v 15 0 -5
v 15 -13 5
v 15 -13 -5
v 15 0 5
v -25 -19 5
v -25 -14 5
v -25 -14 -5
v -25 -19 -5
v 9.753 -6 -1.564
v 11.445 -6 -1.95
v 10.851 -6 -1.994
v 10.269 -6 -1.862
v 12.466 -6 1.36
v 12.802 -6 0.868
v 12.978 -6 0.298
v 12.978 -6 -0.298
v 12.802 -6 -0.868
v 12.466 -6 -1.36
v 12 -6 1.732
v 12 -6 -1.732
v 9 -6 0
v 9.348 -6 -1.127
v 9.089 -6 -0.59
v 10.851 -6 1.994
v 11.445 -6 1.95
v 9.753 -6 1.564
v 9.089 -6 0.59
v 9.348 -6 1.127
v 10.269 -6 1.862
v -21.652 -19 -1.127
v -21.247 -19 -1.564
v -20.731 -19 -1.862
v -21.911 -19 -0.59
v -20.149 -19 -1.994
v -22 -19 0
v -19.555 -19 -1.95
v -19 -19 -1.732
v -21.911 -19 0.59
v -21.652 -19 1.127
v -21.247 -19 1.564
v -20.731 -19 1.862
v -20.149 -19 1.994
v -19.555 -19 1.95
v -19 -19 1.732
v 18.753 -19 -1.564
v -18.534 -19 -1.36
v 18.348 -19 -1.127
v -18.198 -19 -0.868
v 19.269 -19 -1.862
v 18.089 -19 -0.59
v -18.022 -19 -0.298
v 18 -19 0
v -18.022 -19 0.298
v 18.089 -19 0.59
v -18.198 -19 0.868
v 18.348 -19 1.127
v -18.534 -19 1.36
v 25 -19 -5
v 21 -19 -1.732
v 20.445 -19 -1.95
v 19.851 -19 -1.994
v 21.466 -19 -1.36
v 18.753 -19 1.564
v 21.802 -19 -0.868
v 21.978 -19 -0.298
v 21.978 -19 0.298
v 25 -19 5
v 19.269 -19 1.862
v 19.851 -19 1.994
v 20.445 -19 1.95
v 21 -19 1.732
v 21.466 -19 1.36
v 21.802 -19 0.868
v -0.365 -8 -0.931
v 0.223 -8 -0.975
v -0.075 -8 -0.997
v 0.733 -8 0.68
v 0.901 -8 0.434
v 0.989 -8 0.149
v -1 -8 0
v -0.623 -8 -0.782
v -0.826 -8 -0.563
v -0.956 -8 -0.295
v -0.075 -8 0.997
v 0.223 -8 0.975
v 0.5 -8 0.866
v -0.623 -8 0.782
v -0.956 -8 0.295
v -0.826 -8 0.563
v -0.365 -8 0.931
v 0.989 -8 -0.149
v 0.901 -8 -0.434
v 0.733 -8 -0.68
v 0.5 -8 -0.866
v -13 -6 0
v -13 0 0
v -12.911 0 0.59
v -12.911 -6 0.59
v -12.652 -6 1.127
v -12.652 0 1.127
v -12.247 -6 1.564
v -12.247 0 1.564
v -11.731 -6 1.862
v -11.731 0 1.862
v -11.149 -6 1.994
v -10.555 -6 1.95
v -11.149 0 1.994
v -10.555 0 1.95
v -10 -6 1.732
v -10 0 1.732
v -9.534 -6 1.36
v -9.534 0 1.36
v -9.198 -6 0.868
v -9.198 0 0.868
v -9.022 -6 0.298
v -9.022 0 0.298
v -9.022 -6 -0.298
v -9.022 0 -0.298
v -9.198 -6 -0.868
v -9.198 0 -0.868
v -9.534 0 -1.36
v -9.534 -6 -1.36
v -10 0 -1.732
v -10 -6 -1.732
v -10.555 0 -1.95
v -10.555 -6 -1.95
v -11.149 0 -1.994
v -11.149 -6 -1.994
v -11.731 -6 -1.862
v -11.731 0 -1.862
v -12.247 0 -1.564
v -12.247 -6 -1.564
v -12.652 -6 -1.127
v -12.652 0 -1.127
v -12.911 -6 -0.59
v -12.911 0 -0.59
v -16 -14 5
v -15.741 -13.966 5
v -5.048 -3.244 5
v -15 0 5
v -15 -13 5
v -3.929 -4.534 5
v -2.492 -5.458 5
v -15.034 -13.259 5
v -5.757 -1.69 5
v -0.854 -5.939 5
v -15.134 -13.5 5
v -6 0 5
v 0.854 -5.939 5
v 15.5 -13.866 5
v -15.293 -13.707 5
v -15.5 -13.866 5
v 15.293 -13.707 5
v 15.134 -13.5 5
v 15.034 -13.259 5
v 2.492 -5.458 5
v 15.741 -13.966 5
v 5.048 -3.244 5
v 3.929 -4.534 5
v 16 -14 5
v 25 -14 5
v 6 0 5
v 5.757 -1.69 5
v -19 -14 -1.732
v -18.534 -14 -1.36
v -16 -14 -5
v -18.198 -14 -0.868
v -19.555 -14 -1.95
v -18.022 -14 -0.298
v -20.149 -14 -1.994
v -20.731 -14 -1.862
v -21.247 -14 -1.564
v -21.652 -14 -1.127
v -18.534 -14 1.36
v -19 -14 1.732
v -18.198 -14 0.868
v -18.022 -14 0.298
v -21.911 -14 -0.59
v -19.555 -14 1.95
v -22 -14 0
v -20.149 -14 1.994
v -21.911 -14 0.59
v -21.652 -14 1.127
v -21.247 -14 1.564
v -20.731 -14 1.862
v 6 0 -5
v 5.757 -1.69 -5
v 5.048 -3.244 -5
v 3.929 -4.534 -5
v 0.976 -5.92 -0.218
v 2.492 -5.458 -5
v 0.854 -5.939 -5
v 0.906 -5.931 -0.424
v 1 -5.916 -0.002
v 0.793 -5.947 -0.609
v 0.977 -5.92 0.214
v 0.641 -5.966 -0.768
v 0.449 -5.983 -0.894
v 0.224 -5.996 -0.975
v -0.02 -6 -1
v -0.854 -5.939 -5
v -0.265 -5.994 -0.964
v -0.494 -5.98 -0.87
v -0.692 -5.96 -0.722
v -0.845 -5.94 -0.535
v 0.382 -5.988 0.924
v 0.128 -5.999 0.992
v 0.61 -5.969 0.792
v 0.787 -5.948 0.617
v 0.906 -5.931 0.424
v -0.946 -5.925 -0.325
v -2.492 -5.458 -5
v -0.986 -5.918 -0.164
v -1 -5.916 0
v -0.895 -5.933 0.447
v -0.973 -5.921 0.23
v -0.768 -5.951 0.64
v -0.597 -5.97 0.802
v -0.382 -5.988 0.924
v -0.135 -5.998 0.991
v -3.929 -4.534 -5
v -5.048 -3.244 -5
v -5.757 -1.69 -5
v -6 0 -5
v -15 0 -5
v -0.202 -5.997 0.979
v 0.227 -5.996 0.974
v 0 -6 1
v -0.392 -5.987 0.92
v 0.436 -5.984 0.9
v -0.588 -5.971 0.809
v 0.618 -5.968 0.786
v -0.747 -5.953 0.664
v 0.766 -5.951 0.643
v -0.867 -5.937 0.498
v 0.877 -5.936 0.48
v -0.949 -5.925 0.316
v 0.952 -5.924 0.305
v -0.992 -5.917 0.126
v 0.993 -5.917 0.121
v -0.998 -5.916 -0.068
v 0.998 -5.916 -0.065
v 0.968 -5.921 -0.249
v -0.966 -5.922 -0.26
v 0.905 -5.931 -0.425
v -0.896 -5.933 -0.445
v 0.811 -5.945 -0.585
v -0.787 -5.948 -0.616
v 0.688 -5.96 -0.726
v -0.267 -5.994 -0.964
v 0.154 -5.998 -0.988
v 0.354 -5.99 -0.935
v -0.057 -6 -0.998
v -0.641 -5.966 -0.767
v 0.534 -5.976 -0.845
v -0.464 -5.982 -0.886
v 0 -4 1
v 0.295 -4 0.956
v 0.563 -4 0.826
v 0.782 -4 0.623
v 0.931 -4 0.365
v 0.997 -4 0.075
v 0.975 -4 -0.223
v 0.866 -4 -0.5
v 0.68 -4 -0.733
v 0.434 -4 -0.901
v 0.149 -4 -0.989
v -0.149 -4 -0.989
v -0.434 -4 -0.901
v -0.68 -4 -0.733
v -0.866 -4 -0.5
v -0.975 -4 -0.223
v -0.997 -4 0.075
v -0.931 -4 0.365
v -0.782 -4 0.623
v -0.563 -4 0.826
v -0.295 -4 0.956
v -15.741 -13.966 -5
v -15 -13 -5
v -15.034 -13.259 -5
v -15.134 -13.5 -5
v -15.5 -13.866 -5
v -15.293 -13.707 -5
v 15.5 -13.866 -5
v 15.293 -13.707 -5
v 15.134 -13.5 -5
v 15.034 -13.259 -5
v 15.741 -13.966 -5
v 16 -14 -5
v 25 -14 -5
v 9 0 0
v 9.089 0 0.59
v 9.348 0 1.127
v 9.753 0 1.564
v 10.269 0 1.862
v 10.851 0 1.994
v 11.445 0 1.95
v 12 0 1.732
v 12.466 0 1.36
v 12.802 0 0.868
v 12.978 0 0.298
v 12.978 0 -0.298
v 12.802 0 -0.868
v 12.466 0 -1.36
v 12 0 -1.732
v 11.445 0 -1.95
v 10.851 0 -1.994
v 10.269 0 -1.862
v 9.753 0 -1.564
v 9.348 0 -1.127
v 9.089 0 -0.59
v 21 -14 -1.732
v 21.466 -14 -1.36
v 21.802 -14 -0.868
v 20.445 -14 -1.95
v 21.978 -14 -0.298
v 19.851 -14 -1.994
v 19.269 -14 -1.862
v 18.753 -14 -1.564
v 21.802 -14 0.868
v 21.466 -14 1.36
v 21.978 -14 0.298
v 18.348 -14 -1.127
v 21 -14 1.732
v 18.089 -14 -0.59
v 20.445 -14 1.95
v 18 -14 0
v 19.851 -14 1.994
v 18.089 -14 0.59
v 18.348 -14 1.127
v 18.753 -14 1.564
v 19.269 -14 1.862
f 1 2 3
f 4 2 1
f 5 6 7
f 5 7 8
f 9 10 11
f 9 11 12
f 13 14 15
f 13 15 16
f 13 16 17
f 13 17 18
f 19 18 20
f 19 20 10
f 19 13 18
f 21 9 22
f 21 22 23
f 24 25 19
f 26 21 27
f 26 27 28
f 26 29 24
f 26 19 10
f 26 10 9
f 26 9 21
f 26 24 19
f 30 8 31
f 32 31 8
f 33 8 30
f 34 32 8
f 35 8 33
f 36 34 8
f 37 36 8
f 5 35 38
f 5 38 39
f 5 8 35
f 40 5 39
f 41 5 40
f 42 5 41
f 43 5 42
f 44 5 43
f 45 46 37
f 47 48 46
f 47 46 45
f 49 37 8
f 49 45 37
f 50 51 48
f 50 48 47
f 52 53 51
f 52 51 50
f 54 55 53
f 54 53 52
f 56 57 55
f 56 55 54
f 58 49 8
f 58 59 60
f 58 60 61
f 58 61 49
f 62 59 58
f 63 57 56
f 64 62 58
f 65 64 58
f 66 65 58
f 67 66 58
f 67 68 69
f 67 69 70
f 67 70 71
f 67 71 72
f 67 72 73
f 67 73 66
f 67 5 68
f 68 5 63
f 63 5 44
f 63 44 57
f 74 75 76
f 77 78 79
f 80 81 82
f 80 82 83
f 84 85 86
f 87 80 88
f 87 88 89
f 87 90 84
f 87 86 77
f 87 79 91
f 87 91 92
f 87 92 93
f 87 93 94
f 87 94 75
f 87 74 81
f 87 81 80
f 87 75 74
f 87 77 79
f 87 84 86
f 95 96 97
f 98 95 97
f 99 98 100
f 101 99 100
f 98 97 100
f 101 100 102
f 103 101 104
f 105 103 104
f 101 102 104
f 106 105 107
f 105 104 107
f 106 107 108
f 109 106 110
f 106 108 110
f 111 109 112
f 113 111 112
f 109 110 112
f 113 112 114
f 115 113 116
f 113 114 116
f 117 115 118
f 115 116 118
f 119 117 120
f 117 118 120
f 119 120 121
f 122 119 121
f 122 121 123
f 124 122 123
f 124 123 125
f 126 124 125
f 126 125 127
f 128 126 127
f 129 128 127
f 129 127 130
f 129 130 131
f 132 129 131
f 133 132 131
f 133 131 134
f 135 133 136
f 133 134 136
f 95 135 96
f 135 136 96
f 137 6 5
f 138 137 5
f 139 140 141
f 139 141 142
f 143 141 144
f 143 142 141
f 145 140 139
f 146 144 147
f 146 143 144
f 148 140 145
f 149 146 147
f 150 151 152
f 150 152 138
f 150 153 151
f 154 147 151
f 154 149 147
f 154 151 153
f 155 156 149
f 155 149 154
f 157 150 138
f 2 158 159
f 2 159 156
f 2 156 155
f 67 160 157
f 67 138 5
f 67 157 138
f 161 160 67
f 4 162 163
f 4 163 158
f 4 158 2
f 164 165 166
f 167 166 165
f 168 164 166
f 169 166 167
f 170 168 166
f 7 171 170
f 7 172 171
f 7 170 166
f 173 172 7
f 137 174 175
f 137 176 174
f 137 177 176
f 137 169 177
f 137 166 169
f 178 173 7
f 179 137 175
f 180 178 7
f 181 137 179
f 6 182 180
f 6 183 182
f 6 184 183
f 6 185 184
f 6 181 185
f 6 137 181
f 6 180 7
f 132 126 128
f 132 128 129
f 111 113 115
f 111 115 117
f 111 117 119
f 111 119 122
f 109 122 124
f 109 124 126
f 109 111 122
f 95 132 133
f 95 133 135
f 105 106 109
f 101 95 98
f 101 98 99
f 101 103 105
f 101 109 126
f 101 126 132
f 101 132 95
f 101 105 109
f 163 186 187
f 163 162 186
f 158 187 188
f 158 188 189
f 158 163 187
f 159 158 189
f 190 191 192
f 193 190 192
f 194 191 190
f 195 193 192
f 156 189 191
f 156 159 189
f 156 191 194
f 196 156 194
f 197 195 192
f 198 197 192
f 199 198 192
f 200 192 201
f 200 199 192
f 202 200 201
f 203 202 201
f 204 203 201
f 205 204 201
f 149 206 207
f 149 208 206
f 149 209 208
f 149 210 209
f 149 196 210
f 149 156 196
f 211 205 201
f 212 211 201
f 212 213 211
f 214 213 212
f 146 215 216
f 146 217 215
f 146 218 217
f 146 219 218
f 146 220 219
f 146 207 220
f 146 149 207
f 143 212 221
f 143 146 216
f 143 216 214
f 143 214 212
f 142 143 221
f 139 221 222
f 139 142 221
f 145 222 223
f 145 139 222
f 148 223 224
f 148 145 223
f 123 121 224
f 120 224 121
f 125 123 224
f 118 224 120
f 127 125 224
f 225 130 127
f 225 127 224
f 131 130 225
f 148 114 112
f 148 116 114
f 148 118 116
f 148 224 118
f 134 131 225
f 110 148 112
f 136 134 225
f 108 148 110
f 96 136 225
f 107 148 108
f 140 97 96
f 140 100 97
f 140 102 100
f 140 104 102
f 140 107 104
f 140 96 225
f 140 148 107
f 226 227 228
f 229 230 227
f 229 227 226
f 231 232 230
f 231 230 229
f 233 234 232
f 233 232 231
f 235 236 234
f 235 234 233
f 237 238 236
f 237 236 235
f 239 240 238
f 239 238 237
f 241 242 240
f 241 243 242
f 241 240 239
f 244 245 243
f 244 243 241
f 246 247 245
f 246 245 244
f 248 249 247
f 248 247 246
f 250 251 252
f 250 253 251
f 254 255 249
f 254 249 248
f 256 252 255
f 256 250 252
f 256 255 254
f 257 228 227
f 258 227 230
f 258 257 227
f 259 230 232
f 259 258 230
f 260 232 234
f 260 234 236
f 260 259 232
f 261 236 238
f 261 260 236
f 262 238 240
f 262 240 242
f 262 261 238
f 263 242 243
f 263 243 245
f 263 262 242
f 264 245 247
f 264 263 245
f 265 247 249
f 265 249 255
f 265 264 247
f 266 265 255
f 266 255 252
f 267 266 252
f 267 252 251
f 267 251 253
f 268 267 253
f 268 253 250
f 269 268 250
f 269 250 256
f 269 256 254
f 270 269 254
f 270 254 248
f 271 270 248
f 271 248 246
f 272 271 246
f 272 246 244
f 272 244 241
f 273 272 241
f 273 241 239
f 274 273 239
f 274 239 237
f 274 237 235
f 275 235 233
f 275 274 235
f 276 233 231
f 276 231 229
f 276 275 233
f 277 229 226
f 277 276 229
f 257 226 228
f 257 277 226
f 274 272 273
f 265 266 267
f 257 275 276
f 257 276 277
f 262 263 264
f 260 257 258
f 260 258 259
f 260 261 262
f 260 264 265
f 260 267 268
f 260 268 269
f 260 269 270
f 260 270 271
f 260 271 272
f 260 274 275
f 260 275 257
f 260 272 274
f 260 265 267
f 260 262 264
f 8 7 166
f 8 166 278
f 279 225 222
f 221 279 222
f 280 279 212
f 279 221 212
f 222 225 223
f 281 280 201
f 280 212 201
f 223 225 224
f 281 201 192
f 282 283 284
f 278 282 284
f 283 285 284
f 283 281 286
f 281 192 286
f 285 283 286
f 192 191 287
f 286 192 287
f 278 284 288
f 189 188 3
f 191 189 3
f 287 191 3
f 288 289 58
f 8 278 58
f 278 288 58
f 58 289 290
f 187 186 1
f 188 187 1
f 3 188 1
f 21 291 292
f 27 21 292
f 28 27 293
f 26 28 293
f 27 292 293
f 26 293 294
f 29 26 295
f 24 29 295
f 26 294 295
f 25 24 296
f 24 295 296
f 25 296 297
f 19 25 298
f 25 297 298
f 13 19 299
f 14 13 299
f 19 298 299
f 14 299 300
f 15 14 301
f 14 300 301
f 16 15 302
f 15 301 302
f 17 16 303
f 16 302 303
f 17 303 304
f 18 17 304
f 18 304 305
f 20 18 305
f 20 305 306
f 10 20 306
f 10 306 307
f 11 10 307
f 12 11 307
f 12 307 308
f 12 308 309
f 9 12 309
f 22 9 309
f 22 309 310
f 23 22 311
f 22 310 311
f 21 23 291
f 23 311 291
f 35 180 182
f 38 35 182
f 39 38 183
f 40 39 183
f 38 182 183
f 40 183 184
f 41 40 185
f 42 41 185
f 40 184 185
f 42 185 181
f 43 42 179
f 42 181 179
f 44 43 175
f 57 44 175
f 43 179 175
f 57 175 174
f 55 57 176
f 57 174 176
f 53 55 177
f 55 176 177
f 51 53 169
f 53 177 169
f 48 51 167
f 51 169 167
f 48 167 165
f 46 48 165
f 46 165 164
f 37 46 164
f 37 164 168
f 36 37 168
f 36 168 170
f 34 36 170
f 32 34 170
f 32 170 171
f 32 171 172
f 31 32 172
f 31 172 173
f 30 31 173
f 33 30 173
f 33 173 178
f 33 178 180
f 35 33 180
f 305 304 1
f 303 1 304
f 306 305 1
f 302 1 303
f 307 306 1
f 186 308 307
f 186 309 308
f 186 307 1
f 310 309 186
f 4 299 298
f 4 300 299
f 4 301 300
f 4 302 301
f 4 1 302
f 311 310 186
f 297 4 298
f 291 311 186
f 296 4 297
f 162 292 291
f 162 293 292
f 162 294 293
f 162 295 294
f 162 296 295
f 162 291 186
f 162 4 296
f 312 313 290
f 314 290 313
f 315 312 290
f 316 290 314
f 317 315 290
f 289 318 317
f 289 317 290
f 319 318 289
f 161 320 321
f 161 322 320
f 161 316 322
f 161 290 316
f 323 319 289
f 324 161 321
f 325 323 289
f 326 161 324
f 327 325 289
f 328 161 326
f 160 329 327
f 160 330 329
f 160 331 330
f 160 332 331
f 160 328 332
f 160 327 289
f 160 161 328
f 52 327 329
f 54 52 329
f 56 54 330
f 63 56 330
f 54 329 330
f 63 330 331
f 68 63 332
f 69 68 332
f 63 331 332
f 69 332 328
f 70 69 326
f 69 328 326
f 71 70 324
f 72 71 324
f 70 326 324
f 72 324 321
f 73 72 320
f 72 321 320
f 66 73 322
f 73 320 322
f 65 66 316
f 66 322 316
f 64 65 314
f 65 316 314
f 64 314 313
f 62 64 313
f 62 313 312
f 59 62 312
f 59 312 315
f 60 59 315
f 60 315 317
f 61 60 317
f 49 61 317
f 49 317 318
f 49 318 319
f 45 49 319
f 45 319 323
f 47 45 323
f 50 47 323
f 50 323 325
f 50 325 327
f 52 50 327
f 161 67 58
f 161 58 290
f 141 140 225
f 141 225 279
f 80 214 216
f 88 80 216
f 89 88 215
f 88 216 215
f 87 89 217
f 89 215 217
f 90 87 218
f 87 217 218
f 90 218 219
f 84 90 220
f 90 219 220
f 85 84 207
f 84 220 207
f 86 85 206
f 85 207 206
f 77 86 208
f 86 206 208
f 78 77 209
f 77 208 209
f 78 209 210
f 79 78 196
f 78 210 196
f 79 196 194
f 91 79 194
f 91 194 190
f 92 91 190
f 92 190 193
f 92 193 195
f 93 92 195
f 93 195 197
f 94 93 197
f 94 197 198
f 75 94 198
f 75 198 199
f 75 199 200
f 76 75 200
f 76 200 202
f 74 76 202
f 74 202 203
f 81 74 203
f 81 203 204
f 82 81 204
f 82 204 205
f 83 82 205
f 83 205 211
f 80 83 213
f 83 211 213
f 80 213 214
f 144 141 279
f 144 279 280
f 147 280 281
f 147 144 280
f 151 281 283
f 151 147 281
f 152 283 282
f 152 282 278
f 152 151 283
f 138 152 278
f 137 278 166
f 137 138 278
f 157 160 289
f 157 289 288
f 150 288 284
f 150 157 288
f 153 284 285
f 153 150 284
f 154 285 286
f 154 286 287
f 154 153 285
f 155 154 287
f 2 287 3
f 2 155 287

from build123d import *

# Parameters (mm, degrees)
BOSS_EXTRUDE1_DEPTH      = 5
SKETCH2_R                = 2
CUT_EXTRUDE1_DEPTH       = 30.086079144
SKETCH3_R                = 2
CUT_EXTRUDE2_DEPTH       = 6
SKETCH4_R                = 1
CUT_EXTRUDE3_DEPTH       = 8
BOSS_EXTRUDE3_REACH      = 31.58
BOSS_EXTRUDE3_END_RADIUS = 6
SKETCH5_R                = 1


with BuildPart() as part:
    # Sketch1 → Boss-Extrude1 (new, symmetric)
    with BuildSketch(Plane.XY):
        with BuildLine():
            Line((-6, 0), (-15, 0))
            Line((-15, 0), (-15, -13))
            ThreePointArc((-15, -13), (-15.292893219, -13.707106781), (-16, -14))
            Line((-16, -14), (-25, -14))
            Line((-25, -14), (-25, -19))
            Line((-25, -19), (25, -19))
            Line((25, -19), (25, -14))
            Line((25, -14), (16, -14))
            ThreePointArc((16, -14), (15.292893219, -13.707106781), (15, -13))
            Line((15, -13), (15, 0))
            Line((15, 0), (6, 0))
            ThreePointArc((6, 0), (0, -6), (-6, 0))
        make_face()
    extrude(amount=BOSS_EXTRUDE1_DEPTH, both=True)

    # Sketch2 → Cut-Extrude1 (cut, through all)
    with BuildSketch(Plane(origin=(0, -14, 0), x_dir=(1, 0, 0), z_dir=(0, 1, 0))):
        with Locations(Location((-20, 0, 0), (0, 0, 180))):
            Circle(SKETCH2_R)
        with Locations(Location((20, 0, 0), (0, 0, 180))):
            Circle(SKETCH2_R)
    extrude(amount=-CUT_EXTRUDE1_DEPTH, mode=Mode.SUBTRACT)

    # Sketch3 → Cut-Extrude2 (cut)
    with BuildSketch(Plane(origin=(0, 0, 0), x_dir=(1, 0, 0), z_dir=(0, 1, 0))):
        with Locations(Location((-11, 0, 0), (0, 0, 180))):
            Circle(SKETCH3_R)
        with Locations(Location((11, 0, 0), (0, 0, 180))):
            Circle(SKETCH3_R)
    extrude(amount=-CUT_EXTRUDE2_DEPTH, mode=Mode.SUBTRACT)

    # Sketch4 → Cut-Extrude3 (cut)
    with BuildSketch(Plane(origin=(0, 0, 0), x_dir=(1, 0, 0), z_dir=(0, 1, 0))):
        with Locations(Location((0, 0, 0), (0, 0, 180))):
            Circle(SKETCH4_R)
    extrude(amount=-CUT_EXTRUDE3_DEPTH, mode=Mode.SUBTRACT)


with BuildPart() as body_2:
    # Boss-Extrude3: up to this cylinder (the profile starts inside it)
    boss_extrude3_end = Plane(origin=(0, 0, 0), z_dir=(0, 0, -1)) * Cylinder(BOSS_EXTRUDE3_END_RADIUS, 76.16, mode=Mode.PRIVATE)
    # Sketch5 → Boss-Extrude3 (new, up to the surface)
    with BuildSketch(Plane(origin=(0, -4, 0), x_dir=(1, 0, 0), z_dir=(0, 1, 0)), mode=Mode.PRIVATE) as boss_extrude3_sk1:
        with Locations(Location((0, 0, 0), (0, 0, 270))):
            Circle(SKETCH5_R)
    boss_extrude3_tool1 = extrude(boss_extrude3_sk1.sketch, amount=-BOSS_EXTRUDE3_REACH, mode=Mode.PRIVATE) & boss_extrude3_end
    add(boss_extrude3_tool1.solids().sort_by_distance((0, -4, 0))[0])


solid = Compound([part.part, body_2.part])
